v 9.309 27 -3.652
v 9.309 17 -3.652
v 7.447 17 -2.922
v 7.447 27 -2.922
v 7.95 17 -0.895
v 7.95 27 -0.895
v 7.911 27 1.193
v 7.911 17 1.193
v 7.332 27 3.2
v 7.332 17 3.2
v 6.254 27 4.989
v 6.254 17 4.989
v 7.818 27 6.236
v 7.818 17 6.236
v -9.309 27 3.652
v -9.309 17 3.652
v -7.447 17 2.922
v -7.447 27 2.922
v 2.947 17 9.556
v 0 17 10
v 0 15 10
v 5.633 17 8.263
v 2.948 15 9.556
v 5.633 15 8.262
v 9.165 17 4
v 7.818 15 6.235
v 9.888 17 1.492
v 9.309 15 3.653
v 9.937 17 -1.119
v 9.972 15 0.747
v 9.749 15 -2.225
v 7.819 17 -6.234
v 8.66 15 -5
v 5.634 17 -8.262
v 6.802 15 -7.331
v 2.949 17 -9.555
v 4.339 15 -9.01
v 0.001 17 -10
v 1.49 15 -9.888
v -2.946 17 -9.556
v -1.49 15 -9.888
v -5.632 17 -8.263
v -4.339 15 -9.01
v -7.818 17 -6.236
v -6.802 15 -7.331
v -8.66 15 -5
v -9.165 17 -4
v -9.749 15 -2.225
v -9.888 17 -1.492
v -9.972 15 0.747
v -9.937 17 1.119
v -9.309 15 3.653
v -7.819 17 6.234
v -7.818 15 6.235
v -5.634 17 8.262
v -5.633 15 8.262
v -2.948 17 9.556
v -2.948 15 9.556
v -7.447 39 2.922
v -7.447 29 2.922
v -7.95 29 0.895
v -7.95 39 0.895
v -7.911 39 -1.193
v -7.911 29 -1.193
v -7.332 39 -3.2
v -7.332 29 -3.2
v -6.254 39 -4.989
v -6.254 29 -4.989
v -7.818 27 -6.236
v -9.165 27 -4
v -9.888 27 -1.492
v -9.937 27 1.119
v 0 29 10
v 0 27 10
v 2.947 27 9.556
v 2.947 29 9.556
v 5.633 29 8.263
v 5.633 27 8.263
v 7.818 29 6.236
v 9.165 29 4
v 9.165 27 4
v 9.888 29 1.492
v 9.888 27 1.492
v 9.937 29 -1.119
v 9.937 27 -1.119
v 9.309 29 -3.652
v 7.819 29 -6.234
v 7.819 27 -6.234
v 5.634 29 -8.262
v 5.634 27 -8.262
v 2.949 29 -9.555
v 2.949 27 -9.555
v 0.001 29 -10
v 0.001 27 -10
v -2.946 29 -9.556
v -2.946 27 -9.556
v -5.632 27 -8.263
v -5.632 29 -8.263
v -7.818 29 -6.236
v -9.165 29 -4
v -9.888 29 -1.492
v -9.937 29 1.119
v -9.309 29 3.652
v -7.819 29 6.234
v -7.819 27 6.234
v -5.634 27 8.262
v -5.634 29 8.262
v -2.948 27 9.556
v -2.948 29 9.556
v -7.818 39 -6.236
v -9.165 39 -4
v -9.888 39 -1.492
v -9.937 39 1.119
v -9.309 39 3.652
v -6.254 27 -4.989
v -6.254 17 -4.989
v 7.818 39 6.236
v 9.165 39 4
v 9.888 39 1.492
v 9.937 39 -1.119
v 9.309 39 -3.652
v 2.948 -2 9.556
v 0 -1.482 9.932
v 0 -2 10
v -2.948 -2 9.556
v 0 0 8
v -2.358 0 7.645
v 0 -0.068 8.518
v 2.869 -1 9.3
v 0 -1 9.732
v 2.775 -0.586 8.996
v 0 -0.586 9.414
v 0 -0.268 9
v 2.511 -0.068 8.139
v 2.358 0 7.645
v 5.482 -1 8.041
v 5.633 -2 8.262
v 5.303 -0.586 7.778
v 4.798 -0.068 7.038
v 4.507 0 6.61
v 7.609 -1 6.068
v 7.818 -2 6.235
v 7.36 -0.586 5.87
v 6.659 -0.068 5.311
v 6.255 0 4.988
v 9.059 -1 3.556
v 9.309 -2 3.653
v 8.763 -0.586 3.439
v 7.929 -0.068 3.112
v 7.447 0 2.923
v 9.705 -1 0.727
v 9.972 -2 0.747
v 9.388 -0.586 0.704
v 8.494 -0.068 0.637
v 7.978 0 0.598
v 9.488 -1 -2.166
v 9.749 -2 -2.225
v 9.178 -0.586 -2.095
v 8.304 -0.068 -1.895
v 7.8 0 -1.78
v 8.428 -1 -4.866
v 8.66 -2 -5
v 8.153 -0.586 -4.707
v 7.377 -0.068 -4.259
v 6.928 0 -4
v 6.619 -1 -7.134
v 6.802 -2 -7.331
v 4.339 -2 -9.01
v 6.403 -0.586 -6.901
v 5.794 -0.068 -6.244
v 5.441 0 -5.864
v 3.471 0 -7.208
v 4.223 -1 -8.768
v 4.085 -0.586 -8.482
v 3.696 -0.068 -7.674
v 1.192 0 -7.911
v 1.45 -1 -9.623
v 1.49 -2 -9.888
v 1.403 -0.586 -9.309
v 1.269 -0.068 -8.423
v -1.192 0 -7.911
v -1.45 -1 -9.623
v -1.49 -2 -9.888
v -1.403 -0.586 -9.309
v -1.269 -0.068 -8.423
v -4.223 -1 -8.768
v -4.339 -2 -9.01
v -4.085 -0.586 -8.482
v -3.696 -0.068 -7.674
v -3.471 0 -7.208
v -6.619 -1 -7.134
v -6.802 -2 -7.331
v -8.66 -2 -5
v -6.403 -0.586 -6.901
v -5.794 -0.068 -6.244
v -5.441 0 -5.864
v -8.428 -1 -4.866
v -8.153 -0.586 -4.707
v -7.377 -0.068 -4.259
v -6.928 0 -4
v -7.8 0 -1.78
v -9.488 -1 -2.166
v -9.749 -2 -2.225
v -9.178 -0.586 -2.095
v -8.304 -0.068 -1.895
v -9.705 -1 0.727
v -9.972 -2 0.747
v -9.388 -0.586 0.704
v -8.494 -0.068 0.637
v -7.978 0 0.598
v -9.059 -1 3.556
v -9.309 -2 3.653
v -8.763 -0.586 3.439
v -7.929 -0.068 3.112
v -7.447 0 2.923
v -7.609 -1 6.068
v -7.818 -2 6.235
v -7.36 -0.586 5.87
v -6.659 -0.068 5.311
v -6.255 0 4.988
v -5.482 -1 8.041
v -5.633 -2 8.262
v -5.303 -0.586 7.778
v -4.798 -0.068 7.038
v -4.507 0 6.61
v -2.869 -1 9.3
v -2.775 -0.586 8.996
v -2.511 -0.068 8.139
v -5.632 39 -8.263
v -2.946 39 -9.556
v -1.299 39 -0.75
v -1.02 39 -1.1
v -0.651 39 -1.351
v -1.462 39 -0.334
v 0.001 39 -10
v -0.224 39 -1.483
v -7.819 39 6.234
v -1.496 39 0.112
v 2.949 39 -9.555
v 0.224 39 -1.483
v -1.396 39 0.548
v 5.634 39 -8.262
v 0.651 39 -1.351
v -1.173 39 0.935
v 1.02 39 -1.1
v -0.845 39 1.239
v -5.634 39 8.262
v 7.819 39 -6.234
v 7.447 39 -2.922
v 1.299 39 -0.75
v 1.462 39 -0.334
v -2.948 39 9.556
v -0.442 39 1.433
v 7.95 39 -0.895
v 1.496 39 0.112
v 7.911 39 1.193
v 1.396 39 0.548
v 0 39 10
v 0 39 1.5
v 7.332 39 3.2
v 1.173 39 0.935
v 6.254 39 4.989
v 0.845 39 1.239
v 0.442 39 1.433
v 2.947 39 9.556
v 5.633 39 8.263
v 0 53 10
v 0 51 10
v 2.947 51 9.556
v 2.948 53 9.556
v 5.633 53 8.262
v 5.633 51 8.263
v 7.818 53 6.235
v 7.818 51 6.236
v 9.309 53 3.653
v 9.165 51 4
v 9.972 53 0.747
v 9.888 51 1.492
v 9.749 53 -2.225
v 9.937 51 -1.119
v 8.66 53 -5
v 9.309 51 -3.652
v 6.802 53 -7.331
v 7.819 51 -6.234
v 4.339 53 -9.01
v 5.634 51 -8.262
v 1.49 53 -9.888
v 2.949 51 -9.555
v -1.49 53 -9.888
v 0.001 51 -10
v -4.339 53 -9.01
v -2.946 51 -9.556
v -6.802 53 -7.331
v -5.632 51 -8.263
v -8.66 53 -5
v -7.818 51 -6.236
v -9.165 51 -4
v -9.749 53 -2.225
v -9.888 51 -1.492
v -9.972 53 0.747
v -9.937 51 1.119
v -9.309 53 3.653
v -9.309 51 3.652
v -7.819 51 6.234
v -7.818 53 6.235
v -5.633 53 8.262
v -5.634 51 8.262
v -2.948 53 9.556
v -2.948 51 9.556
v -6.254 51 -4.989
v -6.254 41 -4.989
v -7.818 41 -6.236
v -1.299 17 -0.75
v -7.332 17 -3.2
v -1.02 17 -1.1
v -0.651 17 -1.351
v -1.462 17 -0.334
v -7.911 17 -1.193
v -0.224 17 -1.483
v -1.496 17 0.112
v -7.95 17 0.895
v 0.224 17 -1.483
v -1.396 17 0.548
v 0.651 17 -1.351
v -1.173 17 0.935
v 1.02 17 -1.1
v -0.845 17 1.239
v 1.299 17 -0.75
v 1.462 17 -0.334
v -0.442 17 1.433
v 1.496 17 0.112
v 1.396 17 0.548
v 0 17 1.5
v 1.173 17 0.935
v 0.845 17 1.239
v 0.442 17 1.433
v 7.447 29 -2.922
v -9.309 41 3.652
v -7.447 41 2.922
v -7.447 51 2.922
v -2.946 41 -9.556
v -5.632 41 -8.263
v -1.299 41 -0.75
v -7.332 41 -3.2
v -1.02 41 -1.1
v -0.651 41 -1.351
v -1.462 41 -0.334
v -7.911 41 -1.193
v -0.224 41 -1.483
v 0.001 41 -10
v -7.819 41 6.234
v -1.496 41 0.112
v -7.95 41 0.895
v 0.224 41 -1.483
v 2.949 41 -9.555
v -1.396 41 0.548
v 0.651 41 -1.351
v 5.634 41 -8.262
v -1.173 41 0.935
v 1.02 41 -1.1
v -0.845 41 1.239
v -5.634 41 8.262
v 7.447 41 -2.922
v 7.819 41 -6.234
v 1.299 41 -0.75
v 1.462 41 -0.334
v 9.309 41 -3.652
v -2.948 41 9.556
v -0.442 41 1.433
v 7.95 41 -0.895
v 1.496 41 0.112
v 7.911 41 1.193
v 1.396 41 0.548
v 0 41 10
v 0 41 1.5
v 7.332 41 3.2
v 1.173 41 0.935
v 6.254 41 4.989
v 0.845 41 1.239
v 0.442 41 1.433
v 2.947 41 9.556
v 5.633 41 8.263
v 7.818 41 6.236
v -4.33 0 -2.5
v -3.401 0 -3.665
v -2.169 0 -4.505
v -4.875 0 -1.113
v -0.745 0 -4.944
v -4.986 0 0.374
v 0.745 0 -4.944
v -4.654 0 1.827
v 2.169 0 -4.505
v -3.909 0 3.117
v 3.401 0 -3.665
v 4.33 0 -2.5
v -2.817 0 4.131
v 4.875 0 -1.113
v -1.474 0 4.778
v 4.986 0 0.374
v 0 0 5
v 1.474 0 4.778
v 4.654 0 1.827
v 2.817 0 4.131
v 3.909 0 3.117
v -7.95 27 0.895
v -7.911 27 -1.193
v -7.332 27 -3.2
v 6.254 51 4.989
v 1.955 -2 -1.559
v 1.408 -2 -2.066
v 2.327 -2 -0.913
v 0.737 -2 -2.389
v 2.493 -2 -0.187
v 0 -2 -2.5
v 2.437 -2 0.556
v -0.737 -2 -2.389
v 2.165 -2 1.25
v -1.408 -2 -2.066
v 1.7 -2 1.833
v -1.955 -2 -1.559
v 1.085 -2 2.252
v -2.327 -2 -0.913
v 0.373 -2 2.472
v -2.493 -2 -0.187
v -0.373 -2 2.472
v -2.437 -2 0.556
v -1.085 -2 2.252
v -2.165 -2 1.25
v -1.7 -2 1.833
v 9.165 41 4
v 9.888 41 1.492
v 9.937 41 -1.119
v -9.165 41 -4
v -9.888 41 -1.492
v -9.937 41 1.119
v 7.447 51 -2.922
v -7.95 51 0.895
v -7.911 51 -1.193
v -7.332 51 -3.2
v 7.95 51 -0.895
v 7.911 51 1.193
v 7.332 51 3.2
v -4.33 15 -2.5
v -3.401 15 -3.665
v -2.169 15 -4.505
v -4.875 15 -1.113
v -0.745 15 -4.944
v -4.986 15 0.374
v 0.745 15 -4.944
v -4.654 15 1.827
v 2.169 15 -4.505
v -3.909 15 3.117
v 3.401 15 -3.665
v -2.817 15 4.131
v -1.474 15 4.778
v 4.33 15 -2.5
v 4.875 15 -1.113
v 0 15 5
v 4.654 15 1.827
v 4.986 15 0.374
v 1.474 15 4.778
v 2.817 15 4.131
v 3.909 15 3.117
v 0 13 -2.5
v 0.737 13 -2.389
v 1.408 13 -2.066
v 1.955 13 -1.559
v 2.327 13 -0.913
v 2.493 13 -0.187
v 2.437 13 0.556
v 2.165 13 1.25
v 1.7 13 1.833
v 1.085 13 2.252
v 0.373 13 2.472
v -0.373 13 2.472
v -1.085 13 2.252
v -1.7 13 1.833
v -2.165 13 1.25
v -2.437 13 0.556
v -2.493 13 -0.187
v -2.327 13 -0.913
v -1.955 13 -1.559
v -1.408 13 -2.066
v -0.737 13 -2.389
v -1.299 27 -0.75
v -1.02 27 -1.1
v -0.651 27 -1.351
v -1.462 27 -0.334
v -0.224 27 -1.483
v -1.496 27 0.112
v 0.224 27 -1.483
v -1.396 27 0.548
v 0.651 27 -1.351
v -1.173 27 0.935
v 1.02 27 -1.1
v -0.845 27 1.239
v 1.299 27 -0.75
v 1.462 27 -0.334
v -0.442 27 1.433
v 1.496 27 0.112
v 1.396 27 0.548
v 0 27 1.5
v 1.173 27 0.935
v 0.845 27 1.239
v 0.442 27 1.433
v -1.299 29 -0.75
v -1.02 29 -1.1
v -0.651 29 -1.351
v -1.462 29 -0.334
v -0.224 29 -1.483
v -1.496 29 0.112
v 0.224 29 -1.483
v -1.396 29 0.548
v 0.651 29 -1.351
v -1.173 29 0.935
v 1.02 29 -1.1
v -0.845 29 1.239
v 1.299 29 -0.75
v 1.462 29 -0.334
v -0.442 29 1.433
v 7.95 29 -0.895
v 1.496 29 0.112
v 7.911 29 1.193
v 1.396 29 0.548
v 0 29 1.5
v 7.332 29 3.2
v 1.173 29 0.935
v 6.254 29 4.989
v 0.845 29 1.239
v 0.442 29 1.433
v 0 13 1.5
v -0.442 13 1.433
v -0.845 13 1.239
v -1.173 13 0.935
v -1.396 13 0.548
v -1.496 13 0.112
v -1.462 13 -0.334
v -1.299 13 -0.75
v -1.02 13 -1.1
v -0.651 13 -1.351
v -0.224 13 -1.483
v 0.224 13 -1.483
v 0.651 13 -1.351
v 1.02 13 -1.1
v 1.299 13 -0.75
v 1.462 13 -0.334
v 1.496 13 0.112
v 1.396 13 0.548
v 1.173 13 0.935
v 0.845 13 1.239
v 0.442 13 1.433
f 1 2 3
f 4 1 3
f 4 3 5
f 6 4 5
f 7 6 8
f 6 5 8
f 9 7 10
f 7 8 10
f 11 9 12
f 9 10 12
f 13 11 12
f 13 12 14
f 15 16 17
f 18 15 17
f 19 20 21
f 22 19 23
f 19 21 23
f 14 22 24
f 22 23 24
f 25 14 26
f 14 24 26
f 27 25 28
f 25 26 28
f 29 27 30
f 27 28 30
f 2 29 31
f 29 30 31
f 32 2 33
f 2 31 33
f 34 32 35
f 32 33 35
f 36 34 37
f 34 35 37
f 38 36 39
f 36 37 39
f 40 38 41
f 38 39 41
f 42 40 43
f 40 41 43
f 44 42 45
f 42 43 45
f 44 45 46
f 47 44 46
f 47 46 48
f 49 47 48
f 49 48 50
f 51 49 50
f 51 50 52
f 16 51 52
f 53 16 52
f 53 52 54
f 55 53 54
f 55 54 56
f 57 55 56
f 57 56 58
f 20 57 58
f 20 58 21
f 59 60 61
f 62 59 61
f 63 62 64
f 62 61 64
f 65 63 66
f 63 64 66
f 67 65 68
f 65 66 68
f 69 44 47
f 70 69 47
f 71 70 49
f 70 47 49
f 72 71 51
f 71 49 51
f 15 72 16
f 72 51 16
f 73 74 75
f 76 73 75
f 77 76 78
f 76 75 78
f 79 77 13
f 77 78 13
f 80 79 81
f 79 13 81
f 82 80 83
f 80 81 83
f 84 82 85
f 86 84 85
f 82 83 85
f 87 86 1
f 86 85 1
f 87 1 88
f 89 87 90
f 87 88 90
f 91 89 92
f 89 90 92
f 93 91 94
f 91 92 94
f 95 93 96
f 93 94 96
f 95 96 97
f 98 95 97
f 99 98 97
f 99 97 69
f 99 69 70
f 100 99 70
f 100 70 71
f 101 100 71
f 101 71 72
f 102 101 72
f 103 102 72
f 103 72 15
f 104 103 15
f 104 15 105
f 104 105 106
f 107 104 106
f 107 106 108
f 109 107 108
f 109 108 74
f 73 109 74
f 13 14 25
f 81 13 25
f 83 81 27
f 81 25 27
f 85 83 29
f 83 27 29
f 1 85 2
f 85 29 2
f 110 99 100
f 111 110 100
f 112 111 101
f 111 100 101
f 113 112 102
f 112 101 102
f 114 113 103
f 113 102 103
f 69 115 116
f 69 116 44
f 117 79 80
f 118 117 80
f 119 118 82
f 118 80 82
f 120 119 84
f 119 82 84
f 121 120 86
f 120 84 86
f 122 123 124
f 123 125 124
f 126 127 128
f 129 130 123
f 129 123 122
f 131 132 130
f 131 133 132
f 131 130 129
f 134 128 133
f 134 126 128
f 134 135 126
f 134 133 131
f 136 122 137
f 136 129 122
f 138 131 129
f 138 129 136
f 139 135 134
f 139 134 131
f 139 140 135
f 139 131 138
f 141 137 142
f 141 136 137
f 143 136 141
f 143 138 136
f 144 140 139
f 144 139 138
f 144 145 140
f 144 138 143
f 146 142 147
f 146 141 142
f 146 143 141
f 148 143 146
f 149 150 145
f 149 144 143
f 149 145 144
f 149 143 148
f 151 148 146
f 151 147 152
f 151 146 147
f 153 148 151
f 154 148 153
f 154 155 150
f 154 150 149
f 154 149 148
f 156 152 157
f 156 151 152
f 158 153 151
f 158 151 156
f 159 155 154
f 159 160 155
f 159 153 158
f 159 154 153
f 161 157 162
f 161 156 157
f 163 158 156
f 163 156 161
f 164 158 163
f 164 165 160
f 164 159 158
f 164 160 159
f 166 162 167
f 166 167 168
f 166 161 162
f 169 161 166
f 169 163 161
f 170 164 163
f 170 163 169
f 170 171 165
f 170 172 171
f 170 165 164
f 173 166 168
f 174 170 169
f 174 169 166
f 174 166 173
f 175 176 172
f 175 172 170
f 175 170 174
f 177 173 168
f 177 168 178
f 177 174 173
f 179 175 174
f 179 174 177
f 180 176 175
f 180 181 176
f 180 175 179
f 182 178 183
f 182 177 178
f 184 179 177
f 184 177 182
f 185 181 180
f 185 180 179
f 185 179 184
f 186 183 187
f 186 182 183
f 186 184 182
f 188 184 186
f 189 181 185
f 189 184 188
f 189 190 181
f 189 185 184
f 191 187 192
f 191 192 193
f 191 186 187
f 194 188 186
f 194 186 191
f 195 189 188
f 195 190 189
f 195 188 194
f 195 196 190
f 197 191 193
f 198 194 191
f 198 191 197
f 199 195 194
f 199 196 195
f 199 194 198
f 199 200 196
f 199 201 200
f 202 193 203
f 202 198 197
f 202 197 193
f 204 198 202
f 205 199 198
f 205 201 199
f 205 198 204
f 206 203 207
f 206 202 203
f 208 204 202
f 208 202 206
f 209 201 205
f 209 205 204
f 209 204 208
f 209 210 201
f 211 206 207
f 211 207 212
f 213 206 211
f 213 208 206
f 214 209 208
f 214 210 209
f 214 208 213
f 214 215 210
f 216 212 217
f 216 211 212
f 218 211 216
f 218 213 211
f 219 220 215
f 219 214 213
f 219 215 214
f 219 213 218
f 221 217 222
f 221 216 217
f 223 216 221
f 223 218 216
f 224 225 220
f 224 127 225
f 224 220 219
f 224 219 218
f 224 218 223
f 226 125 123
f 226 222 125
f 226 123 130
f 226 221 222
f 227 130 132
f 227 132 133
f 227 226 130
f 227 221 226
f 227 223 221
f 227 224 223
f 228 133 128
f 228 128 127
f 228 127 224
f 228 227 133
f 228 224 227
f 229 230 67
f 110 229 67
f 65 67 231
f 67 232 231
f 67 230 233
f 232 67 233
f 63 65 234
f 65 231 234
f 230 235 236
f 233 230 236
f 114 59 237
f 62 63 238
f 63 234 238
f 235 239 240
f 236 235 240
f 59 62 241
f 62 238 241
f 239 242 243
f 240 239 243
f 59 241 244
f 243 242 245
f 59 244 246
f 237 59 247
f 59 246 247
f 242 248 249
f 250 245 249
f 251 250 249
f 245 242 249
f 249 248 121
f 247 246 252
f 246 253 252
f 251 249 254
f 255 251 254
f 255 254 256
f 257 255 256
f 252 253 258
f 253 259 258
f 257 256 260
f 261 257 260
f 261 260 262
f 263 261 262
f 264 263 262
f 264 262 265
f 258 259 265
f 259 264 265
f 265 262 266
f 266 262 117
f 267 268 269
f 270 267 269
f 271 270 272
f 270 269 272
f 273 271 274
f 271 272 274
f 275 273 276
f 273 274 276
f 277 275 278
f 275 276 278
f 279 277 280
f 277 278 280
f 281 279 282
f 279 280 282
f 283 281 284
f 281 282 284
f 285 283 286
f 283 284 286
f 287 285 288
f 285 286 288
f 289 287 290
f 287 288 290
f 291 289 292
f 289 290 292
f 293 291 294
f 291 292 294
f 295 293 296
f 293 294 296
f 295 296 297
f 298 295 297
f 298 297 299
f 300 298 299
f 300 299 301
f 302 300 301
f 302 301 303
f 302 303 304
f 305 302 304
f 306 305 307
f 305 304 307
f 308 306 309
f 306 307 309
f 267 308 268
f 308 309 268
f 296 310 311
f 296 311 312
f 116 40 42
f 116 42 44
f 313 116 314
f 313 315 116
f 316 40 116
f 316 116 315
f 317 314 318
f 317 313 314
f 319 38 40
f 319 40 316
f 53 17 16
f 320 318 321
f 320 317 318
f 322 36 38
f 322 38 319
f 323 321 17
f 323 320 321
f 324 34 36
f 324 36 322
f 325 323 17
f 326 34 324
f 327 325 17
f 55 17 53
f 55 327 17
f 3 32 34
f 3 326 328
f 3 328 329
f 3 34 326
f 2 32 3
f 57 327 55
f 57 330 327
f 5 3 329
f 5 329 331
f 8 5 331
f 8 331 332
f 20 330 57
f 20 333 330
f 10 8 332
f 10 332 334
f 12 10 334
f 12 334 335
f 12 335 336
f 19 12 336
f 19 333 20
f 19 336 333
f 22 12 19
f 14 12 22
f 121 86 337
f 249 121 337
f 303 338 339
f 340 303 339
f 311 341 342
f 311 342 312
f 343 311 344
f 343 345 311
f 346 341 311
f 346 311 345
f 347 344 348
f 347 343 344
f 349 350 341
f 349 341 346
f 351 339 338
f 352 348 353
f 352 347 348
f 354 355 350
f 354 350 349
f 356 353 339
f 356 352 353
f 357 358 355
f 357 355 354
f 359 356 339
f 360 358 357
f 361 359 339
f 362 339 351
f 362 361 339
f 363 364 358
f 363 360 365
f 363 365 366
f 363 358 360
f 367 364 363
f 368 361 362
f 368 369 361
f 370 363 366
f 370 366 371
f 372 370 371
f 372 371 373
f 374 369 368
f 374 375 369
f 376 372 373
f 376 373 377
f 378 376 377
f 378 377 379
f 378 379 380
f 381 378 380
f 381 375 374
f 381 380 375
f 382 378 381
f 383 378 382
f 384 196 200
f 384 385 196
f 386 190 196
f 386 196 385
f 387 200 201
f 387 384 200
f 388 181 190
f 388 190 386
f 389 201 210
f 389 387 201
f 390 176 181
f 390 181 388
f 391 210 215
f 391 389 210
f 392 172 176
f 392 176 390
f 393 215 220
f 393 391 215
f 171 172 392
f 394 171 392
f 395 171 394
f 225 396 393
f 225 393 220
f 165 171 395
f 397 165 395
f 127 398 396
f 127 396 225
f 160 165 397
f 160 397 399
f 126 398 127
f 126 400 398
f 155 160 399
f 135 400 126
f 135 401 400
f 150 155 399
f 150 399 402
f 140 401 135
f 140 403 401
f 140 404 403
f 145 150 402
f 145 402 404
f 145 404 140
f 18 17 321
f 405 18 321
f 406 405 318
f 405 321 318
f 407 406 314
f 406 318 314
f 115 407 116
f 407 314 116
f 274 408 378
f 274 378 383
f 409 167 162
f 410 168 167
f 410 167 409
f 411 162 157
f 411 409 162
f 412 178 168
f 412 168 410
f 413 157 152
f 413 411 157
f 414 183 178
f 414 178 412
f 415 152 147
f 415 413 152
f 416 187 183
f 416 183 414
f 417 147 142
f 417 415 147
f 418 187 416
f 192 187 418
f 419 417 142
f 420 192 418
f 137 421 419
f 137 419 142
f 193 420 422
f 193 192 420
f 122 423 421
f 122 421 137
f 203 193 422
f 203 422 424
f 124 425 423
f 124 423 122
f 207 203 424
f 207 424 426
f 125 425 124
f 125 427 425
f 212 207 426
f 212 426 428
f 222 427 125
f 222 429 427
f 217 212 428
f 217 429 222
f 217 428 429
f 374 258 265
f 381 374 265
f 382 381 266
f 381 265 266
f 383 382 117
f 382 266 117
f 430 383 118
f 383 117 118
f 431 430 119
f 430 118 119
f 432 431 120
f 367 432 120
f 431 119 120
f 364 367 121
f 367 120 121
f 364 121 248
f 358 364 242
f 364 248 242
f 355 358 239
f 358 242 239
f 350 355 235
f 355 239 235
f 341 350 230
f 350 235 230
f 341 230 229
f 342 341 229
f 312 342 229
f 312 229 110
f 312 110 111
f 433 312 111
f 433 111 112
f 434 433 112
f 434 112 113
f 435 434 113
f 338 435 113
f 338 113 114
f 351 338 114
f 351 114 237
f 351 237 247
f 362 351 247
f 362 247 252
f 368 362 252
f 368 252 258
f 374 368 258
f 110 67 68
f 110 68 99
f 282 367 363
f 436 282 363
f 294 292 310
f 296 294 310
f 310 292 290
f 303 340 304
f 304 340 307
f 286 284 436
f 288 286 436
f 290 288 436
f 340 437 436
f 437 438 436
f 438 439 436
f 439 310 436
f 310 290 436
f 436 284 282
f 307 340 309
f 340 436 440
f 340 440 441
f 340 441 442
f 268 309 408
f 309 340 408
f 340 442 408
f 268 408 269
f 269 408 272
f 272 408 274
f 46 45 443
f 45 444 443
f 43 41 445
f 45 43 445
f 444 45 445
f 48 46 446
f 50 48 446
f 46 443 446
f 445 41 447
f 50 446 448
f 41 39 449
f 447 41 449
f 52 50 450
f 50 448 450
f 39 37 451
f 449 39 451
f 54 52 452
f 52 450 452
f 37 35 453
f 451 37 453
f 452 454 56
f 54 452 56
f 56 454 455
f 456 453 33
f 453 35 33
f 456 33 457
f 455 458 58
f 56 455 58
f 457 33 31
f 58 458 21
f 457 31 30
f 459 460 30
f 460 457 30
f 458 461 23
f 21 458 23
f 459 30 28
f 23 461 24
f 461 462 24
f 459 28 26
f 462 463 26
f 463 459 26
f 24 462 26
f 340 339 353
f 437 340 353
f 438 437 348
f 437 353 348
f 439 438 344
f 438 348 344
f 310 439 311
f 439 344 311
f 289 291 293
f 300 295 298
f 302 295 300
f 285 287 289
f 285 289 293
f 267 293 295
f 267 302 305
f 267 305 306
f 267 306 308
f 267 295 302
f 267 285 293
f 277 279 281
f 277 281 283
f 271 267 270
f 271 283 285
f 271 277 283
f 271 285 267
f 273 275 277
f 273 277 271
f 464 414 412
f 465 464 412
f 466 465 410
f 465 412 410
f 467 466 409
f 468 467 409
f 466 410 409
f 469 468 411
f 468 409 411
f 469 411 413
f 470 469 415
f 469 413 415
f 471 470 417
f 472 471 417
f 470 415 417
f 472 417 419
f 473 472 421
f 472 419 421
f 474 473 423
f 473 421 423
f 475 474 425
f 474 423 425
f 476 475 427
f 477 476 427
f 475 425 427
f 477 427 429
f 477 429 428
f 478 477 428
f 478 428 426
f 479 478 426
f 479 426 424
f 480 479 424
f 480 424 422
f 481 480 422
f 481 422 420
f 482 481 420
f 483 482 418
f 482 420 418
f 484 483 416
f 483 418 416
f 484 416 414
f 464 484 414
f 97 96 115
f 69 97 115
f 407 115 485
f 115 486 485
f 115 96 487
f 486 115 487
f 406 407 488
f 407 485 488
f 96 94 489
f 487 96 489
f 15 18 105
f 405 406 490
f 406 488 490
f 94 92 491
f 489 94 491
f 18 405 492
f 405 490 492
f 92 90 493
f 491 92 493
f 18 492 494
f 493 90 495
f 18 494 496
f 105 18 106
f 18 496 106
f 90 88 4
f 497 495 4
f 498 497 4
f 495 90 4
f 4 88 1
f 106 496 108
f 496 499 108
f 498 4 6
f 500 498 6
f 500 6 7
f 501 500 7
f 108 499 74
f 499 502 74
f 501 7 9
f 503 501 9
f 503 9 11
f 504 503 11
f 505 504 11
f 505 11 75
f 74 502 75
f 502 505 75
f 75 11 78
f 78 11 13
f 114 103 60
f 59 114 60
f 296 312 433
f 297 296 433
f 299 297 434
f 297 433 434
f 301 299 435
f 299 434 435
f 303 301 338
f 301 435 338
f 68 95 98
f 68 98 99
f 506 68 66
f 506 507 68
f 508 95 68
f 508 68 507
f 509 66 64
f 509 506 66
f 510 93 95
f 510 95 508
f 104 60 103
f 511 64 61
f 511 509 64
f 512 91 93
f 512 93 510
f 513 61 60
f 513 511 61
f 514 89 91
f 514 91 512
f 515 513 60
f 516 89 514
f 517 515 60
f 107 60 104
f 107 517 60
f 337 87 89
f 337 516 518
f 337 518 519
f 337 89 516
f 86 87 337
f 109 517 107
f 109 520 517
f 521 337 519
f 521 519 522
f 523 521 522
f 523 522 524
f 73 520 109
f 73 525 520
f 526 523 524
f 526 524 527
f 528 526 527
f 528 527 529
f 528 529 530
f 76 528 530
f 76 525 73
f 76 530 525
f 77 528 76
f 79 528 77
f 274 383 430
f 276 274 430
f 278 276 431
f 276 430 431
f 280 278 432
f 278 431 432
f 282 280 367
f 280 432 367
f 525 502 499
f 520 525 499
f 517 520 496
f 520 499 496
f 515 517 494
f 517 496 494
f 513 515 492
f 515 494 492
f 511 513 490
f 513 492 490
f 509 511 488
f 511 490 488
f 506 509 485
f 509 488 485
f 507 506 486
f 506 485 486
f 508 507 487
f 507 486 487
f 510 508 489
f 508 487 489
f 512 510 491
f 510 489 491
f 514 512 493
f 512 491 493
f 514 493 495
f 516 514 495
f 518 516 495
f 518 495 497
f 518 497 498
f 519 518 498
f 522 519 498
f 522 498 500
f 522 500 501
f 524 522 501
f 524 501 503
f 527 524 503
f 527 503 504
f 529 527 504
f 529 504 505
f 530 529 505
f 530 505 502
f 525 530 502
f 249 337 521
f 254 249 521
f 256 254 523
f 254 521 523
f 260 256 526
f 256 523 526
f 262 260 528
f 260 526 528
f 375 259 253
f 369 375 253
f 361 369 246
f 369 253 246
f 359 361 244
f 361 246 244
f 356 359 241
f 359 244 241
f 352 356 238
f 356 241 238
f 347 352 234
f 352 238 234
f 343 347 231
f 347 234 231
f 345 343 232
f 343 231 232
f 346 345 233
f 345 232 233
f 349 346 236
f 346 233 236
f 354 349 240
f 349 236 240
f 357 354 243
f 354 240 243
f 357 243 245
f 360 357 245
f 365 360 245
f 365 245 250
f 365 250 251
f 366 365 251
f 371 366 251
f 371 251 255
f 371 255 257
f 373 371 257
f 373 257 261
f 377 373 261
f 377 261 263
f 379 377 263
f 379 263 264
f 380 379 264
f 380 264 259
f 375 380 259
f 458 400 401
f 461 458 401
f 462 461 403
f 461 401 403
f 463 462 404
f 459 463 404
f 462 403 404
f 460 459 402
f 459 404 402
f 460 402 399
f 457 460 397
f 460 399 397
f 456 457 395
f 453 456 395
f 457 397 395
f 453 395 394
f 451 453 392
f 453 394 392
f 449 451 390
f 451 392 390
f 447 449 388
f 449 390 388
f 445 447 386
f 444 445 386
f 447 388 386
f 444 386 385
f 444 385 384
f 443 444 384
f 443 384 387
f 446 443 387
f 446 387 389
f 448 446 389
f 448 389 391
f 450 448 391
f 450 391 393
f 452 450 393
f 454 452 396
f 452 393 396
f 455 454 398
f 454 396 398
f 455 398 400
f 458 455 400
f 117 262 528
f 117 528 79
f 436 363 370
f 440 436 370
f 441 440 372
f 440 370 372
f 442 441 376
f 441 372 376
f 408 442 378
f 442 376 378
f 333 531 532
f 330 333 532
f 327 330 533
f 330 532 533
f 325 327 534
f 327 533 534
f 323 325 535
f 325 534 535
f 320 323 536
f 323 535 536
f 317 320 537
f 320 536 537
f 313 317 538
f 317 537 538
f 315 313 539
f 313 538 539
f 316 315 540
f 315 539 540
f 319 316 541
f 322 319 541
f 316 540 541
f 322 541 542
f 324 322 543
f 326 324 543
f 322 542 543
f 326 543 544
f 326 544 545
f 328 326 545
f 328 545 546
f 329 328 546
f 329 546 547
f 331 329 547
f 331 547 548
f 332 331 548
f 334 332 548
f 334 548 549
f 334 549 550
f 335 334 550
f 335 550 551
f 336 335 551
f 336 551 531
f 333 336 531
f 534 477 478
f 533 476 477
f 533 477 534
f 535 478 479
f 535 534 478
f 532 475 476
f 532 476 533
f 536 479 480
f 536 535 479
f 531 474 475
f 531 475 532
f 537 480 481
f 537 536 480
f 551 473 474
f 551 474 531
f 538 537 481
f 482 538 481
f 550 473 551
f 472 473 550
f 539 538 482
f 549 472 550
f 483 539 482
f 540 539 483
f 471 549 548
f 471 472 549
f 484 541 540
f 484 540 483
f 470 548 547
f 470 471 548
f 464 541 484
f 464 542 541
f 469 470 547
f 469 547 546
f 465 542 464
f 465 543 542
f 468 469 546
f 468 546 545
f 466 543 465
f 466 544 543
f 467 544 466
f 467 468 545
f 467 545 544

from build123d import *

# Parameters (mm, degrees)
CROQUIS1_R               = 5
SALIENTE_EXTRUIR1_DEPTH  = 15
CROQUIS1_3_R             = 10
CROQUIS1_3_R_2           = 5
SALIENTE_EXTRUIR2_DEPTH  = 2
CROQUIS2_R               = 10
SALIENTE_EXTRUIR3_DEPTH  = 2
SALIENTE_EXTRUIR4_DEPTH  = 10
CROQUIS4_R               = 10
SALIENTE_EXTRUIR5_DEPTH  = 2
SALIENTE_EXTRUIR6_START  = 12
SALIENTE_EXTRUIR6_DEPTH  = 10
CROQUIS5_R               = 10
SALIENTE_EXTRUIR7_DEPTH  = 2
SALIENTE_EXTRUIR8_START  = 24
SALIENTE_EXTRUIR8_DEPTH  = 10
CROQUIS7_R               = 10
SALIENTE_EXTRUIR9_DEPTH  = 2
CORTAR_EXTRUIR1_REACH    = 56.854
CROQUIS9_R               = 1.5
SALIENTE_EXTRUIR10_START = 2
CROQUIS10_R              = 5
CROQUIS10_R_2            = 1.5
SALIENTE_EXTRUIR10_DEPTH = 2
CROQUIS11_R              = 2.5
CORTAR_EXTRUIR2_DEPTH    = 15
REDONDEO1_R              = 2


with BuildPart() as part:
    # Croquis1 → Saliente-Extruir1 (new body)
    with BuildSketch(Plane(origin=(0, 0, 0), x_dir=(1, 0, 0), z_dir=(0, 1, 0))):
        with Locations(Location((0, 0, 0), (0, 0, 270))):
            Circle(CROQUIS1_R)
    extrude(amount=SALIENTE_EXTRUIR1_DEPTH)

    # Croquis2 → Saliente-Extruir3 (add)
    with BuildSketch(Plane(origin=(0, 15, 0), x_dir=(1, 0, 0), z_dir=(0, 1, 0))):
        with Locations(Location((0, 0, 0), (0, 0, 270))):
            Circle(CROQUIS2_R)
    extrude(amount=SALIENTE_EXTRUIR3_DEPTH)

    # Croquis3 → Saliente-Extruir4 (add)
    with BuildSketch(Plane(origin=(0, 17, 0), x_dir=(1, 0, 0), z_dir=(0, 1, 0))):
        with BuildLine():
            Line((-6.254092926, 4.988619216), (-7.817616157, 6.235774019))
            ThreePointArc((-7.817616157, 6.235774019), (-9.888141199, 1.491530635), (-9.309146792, -3.652367179))
            Line((-9.309146792, -3.652367179), (-7.447317433, -2.921893743))
            ThreePointArc((-7.447317433, -2.921893743), (-7.910512959, 1.193224508), (-6.254092926, 4.988619216))
        make_face()
        with BuildLine():
            ThreePointArc((7.817616157, -6.235774019), (9.888141199, -1.491530635), (9.309146792, 3.652367179))
            Line((9.309146792, 3.652367179), (7.447317433, 2.921893743))
            ThreePointArc((7.447317433, 2.921893743), (7.910512959, -1.193224508), (6.254092926, -4.988619216))
            Line((6.254092926, -4.988619216), (7.817616157, -6.235774019))
        make_face()
    extrude(amount=SALIENTE_EXTRUIR4_DEPTH)

    # Croquis4 → Saliente-Extruir5 (add)
    with BuildSketch(Plane(origin=(0, 27, 0), x_dir=(1, 0, 0), z_dir=(0, 1, 0))):
        with Locations(Location((0, 0, 0), (0, 0, 270))):
            Circle(CROQUIS4_R)
    extrude(amount=SALIENTE_EXTRUIR5_DEPTH)

    # Croquis3<3> → Saliente-Extruir6 (add)
    with BuildSketch(Plane(origin=(0, 17, 0), x_dir=(1, 0, 0), z_dir=(0, 1, 0)).offset(SALIENTE_EXTRUIR6_START)):
        with BuildLine():
            Line((-6.254092926, 4.988619216), (-7.817616157, 6.235774019))
            ThreePointArc((-7.817616157, 6.235774019), (-9.888141199, 1.491530635), (-9.309146792, -3.652367179))
            Line((-9.309146792, -3.652367179), (-7.447317433, -2.921893743))
            ThreePointArc((-7.447317433, -2.921893743), (-7.910512959, 1.193224508), (-6.254092926, 4.988619216))
        make_face()
        with BuildLine():
            ThreePointArc((7.817616157, -6.235774019), (9.888141199, -1.491530635), (9.309146792, 3.652367179))
            Line((9.309146792, 3.652367179), (7.447317433, 2.921893743))
            ThreePointArc((7.447317433, 2.921893743), (7.910512959, -1.193224508), (6.254092926, -4.988619216))
            Line((6.254092926, -4.988619216), (7.817616157, -6.235774019))
        make_face()
    extrude(amount=SALIENTE_EXTRUIR6_DEPTH)

    # Croquis5 → Saliente-Extruir7 (add)
    with BuildSketch(Plane(origin=(0, 39, 0), x_dir=(1, 0, 0), z_dir=(0, 1, 0))):
        with Locations(Location((0, 0, 0), (0, 0, 270))):
            Circle(CROQUIS5_R)
    extrude(amount=SALIENTE_EXTRUIR7_DEPTH)

    # Croquis3<4> → Saliente-Extruir8 (add)
    with BuildSketch(Plane(origin=(0, 17, 0), x_dir=(1, 0, 0), z_dir=(0, 1, 0)).offset(SALIENTE_EXTRUIR8_START)):
        with BuildLine():
            Line((-6.254092926, 4.988619216), (-7.817616157, 6.235774019))
            ThreePointArc((-7.817616157, 6.235774019), (-9.888141199, 1.491530635), (-9.309146792, -3.652367179))
            Line((-9.309146792, -3.652367179), (-7.447317433, -2.921893743))
            ThreePointArc((-7.447317433, -2.921893743), (-7.910512959, 1.193224508), (-6.254092926, 4.988619216))
        make_face()
        with BuildLine():
            ThreePointArc((7.817616157, -6.235774019), (9.888141199, -1.491530635), (9.309146792, 3.652367179))
            Line((9.309146792, 3.652367179), (7.447317433, 2.921893743))
            ThreePointArc((7.447317433, 2.921893743), (7.910512959, -1.193224508), (6.254092926, -4.988619216))
            Line((6.254092926, -4.988619216), (7.817616157, -6.235774019))
        make_face()
    extrude(amount=SALIENTE_EXTRUIR8_DEPTH)

    # Croquis7 → Saliente-Extruir9 (add)
    with BuildSketch(Plane(origin=(0, 51, 0), x_dir=(1, 0, 0), z_dir=(0, 1, 0))):
        with Locations(Location((0, 0, 0), (0, 0, 270))):
            Circle(CROQUIS7_R)
    extrude(amount=SALIENTE_EXTRUIR9_DEPTH)

    # Cortar-Extruir1: up to this face of the body (flat: up to its plane)
    cortar_extruir1_end = Plane(part.part.faces().sort_by_distance((0, 51, 0))[0])
    # Croquis9 → Cortar-Extruir1 (cut, up to the picked face)
    with BuildSketch(Plane.XZ, mode=Mode.PRIVATE) as cortar_extruir1_sk1:
        with Locations(Location((0, 0, 0), (0, 0, 90))):
            Circle(CROQUIS9_R)
    cortar_extruir1_tool1 = split(extrude(cortar_extruir1_sk1.sketch, amount=-CORTAR_EXTRUIR1_REACH, mode=Mode.PRIVATE), bisect_by=cortar_extruir1_end, keep=Keep.BOTH, mode=Mode.PRIVATE)
    add(cortar_extruir1_tool1.solids().sort_by(Axis((0, 0, 0), (0, 1, 0)))[0], mode=Mode.SUBTRACT)



with BuildPart() as body_2:
    # Croquis1<3> → Saliente-Extruir2 (new body)
    with BuildSketch(Plane(origin=(0, 0, 0), x_dir=(1, 0, 0), z_dir=(0, 1, 0))):
        with Locations(Location((0, 0, 0), (0, 0, 270))):
            Circle(CROQUIS1_3_R)
        with Locations(Location((0, 0, 0), (0, 0, 270))):
            Circle(CROQUIS1_3_R_2, mode=Mode.SUBTRACT)
    extrude(amount=-SALIENTE_EXTRUIR2_DEPTH)


with BuildPart() as part_1:
    add(part.part)

    add(body_2.part)  # Saliente-Extruir10 merges body 2
    # Croquis10 → Saliente-Extruir10 (add)
    with BuildSketch(Plane.XZ.offset(SALIENTE_EXTRUIR10_START)):
        with Locations(Location((0, 0, 0), (0, 0, 90))):
            Circle(CROQUIS10_R)
        with Locations(Location((0, 0, 0), (0, 0, 90))):
            Circle(CROQUIS10_R_2, mode=Mode.SUBTRACT)
    extrude(amount=-SALIENTE_EXTRUIR10_DEPTH)

    # Croquis11 → Cortar-Extruir2 (cut)
    with BuildSketch(Plane.XZ.offset(2)):
        with Locations(Location((0, 0, 0), (0, 0, 270))):
            Circle(CROQUIS11_R)
    extrude(amount=-CORTAR_EXTRUIR2_DEPTH, mode=Mode.SUBTRACT)

    # Redondeo1
    redondeo1_edges = [part_1.edges().sort_by_distance(p)[0] for p in [
        (0, 0, -10),
    ]]
    fillet(redondeo1_edges, radius=REDONDEO1_R - 0.0001)  # a hair under: the kernel refuses the full size


solid = part_1.part
